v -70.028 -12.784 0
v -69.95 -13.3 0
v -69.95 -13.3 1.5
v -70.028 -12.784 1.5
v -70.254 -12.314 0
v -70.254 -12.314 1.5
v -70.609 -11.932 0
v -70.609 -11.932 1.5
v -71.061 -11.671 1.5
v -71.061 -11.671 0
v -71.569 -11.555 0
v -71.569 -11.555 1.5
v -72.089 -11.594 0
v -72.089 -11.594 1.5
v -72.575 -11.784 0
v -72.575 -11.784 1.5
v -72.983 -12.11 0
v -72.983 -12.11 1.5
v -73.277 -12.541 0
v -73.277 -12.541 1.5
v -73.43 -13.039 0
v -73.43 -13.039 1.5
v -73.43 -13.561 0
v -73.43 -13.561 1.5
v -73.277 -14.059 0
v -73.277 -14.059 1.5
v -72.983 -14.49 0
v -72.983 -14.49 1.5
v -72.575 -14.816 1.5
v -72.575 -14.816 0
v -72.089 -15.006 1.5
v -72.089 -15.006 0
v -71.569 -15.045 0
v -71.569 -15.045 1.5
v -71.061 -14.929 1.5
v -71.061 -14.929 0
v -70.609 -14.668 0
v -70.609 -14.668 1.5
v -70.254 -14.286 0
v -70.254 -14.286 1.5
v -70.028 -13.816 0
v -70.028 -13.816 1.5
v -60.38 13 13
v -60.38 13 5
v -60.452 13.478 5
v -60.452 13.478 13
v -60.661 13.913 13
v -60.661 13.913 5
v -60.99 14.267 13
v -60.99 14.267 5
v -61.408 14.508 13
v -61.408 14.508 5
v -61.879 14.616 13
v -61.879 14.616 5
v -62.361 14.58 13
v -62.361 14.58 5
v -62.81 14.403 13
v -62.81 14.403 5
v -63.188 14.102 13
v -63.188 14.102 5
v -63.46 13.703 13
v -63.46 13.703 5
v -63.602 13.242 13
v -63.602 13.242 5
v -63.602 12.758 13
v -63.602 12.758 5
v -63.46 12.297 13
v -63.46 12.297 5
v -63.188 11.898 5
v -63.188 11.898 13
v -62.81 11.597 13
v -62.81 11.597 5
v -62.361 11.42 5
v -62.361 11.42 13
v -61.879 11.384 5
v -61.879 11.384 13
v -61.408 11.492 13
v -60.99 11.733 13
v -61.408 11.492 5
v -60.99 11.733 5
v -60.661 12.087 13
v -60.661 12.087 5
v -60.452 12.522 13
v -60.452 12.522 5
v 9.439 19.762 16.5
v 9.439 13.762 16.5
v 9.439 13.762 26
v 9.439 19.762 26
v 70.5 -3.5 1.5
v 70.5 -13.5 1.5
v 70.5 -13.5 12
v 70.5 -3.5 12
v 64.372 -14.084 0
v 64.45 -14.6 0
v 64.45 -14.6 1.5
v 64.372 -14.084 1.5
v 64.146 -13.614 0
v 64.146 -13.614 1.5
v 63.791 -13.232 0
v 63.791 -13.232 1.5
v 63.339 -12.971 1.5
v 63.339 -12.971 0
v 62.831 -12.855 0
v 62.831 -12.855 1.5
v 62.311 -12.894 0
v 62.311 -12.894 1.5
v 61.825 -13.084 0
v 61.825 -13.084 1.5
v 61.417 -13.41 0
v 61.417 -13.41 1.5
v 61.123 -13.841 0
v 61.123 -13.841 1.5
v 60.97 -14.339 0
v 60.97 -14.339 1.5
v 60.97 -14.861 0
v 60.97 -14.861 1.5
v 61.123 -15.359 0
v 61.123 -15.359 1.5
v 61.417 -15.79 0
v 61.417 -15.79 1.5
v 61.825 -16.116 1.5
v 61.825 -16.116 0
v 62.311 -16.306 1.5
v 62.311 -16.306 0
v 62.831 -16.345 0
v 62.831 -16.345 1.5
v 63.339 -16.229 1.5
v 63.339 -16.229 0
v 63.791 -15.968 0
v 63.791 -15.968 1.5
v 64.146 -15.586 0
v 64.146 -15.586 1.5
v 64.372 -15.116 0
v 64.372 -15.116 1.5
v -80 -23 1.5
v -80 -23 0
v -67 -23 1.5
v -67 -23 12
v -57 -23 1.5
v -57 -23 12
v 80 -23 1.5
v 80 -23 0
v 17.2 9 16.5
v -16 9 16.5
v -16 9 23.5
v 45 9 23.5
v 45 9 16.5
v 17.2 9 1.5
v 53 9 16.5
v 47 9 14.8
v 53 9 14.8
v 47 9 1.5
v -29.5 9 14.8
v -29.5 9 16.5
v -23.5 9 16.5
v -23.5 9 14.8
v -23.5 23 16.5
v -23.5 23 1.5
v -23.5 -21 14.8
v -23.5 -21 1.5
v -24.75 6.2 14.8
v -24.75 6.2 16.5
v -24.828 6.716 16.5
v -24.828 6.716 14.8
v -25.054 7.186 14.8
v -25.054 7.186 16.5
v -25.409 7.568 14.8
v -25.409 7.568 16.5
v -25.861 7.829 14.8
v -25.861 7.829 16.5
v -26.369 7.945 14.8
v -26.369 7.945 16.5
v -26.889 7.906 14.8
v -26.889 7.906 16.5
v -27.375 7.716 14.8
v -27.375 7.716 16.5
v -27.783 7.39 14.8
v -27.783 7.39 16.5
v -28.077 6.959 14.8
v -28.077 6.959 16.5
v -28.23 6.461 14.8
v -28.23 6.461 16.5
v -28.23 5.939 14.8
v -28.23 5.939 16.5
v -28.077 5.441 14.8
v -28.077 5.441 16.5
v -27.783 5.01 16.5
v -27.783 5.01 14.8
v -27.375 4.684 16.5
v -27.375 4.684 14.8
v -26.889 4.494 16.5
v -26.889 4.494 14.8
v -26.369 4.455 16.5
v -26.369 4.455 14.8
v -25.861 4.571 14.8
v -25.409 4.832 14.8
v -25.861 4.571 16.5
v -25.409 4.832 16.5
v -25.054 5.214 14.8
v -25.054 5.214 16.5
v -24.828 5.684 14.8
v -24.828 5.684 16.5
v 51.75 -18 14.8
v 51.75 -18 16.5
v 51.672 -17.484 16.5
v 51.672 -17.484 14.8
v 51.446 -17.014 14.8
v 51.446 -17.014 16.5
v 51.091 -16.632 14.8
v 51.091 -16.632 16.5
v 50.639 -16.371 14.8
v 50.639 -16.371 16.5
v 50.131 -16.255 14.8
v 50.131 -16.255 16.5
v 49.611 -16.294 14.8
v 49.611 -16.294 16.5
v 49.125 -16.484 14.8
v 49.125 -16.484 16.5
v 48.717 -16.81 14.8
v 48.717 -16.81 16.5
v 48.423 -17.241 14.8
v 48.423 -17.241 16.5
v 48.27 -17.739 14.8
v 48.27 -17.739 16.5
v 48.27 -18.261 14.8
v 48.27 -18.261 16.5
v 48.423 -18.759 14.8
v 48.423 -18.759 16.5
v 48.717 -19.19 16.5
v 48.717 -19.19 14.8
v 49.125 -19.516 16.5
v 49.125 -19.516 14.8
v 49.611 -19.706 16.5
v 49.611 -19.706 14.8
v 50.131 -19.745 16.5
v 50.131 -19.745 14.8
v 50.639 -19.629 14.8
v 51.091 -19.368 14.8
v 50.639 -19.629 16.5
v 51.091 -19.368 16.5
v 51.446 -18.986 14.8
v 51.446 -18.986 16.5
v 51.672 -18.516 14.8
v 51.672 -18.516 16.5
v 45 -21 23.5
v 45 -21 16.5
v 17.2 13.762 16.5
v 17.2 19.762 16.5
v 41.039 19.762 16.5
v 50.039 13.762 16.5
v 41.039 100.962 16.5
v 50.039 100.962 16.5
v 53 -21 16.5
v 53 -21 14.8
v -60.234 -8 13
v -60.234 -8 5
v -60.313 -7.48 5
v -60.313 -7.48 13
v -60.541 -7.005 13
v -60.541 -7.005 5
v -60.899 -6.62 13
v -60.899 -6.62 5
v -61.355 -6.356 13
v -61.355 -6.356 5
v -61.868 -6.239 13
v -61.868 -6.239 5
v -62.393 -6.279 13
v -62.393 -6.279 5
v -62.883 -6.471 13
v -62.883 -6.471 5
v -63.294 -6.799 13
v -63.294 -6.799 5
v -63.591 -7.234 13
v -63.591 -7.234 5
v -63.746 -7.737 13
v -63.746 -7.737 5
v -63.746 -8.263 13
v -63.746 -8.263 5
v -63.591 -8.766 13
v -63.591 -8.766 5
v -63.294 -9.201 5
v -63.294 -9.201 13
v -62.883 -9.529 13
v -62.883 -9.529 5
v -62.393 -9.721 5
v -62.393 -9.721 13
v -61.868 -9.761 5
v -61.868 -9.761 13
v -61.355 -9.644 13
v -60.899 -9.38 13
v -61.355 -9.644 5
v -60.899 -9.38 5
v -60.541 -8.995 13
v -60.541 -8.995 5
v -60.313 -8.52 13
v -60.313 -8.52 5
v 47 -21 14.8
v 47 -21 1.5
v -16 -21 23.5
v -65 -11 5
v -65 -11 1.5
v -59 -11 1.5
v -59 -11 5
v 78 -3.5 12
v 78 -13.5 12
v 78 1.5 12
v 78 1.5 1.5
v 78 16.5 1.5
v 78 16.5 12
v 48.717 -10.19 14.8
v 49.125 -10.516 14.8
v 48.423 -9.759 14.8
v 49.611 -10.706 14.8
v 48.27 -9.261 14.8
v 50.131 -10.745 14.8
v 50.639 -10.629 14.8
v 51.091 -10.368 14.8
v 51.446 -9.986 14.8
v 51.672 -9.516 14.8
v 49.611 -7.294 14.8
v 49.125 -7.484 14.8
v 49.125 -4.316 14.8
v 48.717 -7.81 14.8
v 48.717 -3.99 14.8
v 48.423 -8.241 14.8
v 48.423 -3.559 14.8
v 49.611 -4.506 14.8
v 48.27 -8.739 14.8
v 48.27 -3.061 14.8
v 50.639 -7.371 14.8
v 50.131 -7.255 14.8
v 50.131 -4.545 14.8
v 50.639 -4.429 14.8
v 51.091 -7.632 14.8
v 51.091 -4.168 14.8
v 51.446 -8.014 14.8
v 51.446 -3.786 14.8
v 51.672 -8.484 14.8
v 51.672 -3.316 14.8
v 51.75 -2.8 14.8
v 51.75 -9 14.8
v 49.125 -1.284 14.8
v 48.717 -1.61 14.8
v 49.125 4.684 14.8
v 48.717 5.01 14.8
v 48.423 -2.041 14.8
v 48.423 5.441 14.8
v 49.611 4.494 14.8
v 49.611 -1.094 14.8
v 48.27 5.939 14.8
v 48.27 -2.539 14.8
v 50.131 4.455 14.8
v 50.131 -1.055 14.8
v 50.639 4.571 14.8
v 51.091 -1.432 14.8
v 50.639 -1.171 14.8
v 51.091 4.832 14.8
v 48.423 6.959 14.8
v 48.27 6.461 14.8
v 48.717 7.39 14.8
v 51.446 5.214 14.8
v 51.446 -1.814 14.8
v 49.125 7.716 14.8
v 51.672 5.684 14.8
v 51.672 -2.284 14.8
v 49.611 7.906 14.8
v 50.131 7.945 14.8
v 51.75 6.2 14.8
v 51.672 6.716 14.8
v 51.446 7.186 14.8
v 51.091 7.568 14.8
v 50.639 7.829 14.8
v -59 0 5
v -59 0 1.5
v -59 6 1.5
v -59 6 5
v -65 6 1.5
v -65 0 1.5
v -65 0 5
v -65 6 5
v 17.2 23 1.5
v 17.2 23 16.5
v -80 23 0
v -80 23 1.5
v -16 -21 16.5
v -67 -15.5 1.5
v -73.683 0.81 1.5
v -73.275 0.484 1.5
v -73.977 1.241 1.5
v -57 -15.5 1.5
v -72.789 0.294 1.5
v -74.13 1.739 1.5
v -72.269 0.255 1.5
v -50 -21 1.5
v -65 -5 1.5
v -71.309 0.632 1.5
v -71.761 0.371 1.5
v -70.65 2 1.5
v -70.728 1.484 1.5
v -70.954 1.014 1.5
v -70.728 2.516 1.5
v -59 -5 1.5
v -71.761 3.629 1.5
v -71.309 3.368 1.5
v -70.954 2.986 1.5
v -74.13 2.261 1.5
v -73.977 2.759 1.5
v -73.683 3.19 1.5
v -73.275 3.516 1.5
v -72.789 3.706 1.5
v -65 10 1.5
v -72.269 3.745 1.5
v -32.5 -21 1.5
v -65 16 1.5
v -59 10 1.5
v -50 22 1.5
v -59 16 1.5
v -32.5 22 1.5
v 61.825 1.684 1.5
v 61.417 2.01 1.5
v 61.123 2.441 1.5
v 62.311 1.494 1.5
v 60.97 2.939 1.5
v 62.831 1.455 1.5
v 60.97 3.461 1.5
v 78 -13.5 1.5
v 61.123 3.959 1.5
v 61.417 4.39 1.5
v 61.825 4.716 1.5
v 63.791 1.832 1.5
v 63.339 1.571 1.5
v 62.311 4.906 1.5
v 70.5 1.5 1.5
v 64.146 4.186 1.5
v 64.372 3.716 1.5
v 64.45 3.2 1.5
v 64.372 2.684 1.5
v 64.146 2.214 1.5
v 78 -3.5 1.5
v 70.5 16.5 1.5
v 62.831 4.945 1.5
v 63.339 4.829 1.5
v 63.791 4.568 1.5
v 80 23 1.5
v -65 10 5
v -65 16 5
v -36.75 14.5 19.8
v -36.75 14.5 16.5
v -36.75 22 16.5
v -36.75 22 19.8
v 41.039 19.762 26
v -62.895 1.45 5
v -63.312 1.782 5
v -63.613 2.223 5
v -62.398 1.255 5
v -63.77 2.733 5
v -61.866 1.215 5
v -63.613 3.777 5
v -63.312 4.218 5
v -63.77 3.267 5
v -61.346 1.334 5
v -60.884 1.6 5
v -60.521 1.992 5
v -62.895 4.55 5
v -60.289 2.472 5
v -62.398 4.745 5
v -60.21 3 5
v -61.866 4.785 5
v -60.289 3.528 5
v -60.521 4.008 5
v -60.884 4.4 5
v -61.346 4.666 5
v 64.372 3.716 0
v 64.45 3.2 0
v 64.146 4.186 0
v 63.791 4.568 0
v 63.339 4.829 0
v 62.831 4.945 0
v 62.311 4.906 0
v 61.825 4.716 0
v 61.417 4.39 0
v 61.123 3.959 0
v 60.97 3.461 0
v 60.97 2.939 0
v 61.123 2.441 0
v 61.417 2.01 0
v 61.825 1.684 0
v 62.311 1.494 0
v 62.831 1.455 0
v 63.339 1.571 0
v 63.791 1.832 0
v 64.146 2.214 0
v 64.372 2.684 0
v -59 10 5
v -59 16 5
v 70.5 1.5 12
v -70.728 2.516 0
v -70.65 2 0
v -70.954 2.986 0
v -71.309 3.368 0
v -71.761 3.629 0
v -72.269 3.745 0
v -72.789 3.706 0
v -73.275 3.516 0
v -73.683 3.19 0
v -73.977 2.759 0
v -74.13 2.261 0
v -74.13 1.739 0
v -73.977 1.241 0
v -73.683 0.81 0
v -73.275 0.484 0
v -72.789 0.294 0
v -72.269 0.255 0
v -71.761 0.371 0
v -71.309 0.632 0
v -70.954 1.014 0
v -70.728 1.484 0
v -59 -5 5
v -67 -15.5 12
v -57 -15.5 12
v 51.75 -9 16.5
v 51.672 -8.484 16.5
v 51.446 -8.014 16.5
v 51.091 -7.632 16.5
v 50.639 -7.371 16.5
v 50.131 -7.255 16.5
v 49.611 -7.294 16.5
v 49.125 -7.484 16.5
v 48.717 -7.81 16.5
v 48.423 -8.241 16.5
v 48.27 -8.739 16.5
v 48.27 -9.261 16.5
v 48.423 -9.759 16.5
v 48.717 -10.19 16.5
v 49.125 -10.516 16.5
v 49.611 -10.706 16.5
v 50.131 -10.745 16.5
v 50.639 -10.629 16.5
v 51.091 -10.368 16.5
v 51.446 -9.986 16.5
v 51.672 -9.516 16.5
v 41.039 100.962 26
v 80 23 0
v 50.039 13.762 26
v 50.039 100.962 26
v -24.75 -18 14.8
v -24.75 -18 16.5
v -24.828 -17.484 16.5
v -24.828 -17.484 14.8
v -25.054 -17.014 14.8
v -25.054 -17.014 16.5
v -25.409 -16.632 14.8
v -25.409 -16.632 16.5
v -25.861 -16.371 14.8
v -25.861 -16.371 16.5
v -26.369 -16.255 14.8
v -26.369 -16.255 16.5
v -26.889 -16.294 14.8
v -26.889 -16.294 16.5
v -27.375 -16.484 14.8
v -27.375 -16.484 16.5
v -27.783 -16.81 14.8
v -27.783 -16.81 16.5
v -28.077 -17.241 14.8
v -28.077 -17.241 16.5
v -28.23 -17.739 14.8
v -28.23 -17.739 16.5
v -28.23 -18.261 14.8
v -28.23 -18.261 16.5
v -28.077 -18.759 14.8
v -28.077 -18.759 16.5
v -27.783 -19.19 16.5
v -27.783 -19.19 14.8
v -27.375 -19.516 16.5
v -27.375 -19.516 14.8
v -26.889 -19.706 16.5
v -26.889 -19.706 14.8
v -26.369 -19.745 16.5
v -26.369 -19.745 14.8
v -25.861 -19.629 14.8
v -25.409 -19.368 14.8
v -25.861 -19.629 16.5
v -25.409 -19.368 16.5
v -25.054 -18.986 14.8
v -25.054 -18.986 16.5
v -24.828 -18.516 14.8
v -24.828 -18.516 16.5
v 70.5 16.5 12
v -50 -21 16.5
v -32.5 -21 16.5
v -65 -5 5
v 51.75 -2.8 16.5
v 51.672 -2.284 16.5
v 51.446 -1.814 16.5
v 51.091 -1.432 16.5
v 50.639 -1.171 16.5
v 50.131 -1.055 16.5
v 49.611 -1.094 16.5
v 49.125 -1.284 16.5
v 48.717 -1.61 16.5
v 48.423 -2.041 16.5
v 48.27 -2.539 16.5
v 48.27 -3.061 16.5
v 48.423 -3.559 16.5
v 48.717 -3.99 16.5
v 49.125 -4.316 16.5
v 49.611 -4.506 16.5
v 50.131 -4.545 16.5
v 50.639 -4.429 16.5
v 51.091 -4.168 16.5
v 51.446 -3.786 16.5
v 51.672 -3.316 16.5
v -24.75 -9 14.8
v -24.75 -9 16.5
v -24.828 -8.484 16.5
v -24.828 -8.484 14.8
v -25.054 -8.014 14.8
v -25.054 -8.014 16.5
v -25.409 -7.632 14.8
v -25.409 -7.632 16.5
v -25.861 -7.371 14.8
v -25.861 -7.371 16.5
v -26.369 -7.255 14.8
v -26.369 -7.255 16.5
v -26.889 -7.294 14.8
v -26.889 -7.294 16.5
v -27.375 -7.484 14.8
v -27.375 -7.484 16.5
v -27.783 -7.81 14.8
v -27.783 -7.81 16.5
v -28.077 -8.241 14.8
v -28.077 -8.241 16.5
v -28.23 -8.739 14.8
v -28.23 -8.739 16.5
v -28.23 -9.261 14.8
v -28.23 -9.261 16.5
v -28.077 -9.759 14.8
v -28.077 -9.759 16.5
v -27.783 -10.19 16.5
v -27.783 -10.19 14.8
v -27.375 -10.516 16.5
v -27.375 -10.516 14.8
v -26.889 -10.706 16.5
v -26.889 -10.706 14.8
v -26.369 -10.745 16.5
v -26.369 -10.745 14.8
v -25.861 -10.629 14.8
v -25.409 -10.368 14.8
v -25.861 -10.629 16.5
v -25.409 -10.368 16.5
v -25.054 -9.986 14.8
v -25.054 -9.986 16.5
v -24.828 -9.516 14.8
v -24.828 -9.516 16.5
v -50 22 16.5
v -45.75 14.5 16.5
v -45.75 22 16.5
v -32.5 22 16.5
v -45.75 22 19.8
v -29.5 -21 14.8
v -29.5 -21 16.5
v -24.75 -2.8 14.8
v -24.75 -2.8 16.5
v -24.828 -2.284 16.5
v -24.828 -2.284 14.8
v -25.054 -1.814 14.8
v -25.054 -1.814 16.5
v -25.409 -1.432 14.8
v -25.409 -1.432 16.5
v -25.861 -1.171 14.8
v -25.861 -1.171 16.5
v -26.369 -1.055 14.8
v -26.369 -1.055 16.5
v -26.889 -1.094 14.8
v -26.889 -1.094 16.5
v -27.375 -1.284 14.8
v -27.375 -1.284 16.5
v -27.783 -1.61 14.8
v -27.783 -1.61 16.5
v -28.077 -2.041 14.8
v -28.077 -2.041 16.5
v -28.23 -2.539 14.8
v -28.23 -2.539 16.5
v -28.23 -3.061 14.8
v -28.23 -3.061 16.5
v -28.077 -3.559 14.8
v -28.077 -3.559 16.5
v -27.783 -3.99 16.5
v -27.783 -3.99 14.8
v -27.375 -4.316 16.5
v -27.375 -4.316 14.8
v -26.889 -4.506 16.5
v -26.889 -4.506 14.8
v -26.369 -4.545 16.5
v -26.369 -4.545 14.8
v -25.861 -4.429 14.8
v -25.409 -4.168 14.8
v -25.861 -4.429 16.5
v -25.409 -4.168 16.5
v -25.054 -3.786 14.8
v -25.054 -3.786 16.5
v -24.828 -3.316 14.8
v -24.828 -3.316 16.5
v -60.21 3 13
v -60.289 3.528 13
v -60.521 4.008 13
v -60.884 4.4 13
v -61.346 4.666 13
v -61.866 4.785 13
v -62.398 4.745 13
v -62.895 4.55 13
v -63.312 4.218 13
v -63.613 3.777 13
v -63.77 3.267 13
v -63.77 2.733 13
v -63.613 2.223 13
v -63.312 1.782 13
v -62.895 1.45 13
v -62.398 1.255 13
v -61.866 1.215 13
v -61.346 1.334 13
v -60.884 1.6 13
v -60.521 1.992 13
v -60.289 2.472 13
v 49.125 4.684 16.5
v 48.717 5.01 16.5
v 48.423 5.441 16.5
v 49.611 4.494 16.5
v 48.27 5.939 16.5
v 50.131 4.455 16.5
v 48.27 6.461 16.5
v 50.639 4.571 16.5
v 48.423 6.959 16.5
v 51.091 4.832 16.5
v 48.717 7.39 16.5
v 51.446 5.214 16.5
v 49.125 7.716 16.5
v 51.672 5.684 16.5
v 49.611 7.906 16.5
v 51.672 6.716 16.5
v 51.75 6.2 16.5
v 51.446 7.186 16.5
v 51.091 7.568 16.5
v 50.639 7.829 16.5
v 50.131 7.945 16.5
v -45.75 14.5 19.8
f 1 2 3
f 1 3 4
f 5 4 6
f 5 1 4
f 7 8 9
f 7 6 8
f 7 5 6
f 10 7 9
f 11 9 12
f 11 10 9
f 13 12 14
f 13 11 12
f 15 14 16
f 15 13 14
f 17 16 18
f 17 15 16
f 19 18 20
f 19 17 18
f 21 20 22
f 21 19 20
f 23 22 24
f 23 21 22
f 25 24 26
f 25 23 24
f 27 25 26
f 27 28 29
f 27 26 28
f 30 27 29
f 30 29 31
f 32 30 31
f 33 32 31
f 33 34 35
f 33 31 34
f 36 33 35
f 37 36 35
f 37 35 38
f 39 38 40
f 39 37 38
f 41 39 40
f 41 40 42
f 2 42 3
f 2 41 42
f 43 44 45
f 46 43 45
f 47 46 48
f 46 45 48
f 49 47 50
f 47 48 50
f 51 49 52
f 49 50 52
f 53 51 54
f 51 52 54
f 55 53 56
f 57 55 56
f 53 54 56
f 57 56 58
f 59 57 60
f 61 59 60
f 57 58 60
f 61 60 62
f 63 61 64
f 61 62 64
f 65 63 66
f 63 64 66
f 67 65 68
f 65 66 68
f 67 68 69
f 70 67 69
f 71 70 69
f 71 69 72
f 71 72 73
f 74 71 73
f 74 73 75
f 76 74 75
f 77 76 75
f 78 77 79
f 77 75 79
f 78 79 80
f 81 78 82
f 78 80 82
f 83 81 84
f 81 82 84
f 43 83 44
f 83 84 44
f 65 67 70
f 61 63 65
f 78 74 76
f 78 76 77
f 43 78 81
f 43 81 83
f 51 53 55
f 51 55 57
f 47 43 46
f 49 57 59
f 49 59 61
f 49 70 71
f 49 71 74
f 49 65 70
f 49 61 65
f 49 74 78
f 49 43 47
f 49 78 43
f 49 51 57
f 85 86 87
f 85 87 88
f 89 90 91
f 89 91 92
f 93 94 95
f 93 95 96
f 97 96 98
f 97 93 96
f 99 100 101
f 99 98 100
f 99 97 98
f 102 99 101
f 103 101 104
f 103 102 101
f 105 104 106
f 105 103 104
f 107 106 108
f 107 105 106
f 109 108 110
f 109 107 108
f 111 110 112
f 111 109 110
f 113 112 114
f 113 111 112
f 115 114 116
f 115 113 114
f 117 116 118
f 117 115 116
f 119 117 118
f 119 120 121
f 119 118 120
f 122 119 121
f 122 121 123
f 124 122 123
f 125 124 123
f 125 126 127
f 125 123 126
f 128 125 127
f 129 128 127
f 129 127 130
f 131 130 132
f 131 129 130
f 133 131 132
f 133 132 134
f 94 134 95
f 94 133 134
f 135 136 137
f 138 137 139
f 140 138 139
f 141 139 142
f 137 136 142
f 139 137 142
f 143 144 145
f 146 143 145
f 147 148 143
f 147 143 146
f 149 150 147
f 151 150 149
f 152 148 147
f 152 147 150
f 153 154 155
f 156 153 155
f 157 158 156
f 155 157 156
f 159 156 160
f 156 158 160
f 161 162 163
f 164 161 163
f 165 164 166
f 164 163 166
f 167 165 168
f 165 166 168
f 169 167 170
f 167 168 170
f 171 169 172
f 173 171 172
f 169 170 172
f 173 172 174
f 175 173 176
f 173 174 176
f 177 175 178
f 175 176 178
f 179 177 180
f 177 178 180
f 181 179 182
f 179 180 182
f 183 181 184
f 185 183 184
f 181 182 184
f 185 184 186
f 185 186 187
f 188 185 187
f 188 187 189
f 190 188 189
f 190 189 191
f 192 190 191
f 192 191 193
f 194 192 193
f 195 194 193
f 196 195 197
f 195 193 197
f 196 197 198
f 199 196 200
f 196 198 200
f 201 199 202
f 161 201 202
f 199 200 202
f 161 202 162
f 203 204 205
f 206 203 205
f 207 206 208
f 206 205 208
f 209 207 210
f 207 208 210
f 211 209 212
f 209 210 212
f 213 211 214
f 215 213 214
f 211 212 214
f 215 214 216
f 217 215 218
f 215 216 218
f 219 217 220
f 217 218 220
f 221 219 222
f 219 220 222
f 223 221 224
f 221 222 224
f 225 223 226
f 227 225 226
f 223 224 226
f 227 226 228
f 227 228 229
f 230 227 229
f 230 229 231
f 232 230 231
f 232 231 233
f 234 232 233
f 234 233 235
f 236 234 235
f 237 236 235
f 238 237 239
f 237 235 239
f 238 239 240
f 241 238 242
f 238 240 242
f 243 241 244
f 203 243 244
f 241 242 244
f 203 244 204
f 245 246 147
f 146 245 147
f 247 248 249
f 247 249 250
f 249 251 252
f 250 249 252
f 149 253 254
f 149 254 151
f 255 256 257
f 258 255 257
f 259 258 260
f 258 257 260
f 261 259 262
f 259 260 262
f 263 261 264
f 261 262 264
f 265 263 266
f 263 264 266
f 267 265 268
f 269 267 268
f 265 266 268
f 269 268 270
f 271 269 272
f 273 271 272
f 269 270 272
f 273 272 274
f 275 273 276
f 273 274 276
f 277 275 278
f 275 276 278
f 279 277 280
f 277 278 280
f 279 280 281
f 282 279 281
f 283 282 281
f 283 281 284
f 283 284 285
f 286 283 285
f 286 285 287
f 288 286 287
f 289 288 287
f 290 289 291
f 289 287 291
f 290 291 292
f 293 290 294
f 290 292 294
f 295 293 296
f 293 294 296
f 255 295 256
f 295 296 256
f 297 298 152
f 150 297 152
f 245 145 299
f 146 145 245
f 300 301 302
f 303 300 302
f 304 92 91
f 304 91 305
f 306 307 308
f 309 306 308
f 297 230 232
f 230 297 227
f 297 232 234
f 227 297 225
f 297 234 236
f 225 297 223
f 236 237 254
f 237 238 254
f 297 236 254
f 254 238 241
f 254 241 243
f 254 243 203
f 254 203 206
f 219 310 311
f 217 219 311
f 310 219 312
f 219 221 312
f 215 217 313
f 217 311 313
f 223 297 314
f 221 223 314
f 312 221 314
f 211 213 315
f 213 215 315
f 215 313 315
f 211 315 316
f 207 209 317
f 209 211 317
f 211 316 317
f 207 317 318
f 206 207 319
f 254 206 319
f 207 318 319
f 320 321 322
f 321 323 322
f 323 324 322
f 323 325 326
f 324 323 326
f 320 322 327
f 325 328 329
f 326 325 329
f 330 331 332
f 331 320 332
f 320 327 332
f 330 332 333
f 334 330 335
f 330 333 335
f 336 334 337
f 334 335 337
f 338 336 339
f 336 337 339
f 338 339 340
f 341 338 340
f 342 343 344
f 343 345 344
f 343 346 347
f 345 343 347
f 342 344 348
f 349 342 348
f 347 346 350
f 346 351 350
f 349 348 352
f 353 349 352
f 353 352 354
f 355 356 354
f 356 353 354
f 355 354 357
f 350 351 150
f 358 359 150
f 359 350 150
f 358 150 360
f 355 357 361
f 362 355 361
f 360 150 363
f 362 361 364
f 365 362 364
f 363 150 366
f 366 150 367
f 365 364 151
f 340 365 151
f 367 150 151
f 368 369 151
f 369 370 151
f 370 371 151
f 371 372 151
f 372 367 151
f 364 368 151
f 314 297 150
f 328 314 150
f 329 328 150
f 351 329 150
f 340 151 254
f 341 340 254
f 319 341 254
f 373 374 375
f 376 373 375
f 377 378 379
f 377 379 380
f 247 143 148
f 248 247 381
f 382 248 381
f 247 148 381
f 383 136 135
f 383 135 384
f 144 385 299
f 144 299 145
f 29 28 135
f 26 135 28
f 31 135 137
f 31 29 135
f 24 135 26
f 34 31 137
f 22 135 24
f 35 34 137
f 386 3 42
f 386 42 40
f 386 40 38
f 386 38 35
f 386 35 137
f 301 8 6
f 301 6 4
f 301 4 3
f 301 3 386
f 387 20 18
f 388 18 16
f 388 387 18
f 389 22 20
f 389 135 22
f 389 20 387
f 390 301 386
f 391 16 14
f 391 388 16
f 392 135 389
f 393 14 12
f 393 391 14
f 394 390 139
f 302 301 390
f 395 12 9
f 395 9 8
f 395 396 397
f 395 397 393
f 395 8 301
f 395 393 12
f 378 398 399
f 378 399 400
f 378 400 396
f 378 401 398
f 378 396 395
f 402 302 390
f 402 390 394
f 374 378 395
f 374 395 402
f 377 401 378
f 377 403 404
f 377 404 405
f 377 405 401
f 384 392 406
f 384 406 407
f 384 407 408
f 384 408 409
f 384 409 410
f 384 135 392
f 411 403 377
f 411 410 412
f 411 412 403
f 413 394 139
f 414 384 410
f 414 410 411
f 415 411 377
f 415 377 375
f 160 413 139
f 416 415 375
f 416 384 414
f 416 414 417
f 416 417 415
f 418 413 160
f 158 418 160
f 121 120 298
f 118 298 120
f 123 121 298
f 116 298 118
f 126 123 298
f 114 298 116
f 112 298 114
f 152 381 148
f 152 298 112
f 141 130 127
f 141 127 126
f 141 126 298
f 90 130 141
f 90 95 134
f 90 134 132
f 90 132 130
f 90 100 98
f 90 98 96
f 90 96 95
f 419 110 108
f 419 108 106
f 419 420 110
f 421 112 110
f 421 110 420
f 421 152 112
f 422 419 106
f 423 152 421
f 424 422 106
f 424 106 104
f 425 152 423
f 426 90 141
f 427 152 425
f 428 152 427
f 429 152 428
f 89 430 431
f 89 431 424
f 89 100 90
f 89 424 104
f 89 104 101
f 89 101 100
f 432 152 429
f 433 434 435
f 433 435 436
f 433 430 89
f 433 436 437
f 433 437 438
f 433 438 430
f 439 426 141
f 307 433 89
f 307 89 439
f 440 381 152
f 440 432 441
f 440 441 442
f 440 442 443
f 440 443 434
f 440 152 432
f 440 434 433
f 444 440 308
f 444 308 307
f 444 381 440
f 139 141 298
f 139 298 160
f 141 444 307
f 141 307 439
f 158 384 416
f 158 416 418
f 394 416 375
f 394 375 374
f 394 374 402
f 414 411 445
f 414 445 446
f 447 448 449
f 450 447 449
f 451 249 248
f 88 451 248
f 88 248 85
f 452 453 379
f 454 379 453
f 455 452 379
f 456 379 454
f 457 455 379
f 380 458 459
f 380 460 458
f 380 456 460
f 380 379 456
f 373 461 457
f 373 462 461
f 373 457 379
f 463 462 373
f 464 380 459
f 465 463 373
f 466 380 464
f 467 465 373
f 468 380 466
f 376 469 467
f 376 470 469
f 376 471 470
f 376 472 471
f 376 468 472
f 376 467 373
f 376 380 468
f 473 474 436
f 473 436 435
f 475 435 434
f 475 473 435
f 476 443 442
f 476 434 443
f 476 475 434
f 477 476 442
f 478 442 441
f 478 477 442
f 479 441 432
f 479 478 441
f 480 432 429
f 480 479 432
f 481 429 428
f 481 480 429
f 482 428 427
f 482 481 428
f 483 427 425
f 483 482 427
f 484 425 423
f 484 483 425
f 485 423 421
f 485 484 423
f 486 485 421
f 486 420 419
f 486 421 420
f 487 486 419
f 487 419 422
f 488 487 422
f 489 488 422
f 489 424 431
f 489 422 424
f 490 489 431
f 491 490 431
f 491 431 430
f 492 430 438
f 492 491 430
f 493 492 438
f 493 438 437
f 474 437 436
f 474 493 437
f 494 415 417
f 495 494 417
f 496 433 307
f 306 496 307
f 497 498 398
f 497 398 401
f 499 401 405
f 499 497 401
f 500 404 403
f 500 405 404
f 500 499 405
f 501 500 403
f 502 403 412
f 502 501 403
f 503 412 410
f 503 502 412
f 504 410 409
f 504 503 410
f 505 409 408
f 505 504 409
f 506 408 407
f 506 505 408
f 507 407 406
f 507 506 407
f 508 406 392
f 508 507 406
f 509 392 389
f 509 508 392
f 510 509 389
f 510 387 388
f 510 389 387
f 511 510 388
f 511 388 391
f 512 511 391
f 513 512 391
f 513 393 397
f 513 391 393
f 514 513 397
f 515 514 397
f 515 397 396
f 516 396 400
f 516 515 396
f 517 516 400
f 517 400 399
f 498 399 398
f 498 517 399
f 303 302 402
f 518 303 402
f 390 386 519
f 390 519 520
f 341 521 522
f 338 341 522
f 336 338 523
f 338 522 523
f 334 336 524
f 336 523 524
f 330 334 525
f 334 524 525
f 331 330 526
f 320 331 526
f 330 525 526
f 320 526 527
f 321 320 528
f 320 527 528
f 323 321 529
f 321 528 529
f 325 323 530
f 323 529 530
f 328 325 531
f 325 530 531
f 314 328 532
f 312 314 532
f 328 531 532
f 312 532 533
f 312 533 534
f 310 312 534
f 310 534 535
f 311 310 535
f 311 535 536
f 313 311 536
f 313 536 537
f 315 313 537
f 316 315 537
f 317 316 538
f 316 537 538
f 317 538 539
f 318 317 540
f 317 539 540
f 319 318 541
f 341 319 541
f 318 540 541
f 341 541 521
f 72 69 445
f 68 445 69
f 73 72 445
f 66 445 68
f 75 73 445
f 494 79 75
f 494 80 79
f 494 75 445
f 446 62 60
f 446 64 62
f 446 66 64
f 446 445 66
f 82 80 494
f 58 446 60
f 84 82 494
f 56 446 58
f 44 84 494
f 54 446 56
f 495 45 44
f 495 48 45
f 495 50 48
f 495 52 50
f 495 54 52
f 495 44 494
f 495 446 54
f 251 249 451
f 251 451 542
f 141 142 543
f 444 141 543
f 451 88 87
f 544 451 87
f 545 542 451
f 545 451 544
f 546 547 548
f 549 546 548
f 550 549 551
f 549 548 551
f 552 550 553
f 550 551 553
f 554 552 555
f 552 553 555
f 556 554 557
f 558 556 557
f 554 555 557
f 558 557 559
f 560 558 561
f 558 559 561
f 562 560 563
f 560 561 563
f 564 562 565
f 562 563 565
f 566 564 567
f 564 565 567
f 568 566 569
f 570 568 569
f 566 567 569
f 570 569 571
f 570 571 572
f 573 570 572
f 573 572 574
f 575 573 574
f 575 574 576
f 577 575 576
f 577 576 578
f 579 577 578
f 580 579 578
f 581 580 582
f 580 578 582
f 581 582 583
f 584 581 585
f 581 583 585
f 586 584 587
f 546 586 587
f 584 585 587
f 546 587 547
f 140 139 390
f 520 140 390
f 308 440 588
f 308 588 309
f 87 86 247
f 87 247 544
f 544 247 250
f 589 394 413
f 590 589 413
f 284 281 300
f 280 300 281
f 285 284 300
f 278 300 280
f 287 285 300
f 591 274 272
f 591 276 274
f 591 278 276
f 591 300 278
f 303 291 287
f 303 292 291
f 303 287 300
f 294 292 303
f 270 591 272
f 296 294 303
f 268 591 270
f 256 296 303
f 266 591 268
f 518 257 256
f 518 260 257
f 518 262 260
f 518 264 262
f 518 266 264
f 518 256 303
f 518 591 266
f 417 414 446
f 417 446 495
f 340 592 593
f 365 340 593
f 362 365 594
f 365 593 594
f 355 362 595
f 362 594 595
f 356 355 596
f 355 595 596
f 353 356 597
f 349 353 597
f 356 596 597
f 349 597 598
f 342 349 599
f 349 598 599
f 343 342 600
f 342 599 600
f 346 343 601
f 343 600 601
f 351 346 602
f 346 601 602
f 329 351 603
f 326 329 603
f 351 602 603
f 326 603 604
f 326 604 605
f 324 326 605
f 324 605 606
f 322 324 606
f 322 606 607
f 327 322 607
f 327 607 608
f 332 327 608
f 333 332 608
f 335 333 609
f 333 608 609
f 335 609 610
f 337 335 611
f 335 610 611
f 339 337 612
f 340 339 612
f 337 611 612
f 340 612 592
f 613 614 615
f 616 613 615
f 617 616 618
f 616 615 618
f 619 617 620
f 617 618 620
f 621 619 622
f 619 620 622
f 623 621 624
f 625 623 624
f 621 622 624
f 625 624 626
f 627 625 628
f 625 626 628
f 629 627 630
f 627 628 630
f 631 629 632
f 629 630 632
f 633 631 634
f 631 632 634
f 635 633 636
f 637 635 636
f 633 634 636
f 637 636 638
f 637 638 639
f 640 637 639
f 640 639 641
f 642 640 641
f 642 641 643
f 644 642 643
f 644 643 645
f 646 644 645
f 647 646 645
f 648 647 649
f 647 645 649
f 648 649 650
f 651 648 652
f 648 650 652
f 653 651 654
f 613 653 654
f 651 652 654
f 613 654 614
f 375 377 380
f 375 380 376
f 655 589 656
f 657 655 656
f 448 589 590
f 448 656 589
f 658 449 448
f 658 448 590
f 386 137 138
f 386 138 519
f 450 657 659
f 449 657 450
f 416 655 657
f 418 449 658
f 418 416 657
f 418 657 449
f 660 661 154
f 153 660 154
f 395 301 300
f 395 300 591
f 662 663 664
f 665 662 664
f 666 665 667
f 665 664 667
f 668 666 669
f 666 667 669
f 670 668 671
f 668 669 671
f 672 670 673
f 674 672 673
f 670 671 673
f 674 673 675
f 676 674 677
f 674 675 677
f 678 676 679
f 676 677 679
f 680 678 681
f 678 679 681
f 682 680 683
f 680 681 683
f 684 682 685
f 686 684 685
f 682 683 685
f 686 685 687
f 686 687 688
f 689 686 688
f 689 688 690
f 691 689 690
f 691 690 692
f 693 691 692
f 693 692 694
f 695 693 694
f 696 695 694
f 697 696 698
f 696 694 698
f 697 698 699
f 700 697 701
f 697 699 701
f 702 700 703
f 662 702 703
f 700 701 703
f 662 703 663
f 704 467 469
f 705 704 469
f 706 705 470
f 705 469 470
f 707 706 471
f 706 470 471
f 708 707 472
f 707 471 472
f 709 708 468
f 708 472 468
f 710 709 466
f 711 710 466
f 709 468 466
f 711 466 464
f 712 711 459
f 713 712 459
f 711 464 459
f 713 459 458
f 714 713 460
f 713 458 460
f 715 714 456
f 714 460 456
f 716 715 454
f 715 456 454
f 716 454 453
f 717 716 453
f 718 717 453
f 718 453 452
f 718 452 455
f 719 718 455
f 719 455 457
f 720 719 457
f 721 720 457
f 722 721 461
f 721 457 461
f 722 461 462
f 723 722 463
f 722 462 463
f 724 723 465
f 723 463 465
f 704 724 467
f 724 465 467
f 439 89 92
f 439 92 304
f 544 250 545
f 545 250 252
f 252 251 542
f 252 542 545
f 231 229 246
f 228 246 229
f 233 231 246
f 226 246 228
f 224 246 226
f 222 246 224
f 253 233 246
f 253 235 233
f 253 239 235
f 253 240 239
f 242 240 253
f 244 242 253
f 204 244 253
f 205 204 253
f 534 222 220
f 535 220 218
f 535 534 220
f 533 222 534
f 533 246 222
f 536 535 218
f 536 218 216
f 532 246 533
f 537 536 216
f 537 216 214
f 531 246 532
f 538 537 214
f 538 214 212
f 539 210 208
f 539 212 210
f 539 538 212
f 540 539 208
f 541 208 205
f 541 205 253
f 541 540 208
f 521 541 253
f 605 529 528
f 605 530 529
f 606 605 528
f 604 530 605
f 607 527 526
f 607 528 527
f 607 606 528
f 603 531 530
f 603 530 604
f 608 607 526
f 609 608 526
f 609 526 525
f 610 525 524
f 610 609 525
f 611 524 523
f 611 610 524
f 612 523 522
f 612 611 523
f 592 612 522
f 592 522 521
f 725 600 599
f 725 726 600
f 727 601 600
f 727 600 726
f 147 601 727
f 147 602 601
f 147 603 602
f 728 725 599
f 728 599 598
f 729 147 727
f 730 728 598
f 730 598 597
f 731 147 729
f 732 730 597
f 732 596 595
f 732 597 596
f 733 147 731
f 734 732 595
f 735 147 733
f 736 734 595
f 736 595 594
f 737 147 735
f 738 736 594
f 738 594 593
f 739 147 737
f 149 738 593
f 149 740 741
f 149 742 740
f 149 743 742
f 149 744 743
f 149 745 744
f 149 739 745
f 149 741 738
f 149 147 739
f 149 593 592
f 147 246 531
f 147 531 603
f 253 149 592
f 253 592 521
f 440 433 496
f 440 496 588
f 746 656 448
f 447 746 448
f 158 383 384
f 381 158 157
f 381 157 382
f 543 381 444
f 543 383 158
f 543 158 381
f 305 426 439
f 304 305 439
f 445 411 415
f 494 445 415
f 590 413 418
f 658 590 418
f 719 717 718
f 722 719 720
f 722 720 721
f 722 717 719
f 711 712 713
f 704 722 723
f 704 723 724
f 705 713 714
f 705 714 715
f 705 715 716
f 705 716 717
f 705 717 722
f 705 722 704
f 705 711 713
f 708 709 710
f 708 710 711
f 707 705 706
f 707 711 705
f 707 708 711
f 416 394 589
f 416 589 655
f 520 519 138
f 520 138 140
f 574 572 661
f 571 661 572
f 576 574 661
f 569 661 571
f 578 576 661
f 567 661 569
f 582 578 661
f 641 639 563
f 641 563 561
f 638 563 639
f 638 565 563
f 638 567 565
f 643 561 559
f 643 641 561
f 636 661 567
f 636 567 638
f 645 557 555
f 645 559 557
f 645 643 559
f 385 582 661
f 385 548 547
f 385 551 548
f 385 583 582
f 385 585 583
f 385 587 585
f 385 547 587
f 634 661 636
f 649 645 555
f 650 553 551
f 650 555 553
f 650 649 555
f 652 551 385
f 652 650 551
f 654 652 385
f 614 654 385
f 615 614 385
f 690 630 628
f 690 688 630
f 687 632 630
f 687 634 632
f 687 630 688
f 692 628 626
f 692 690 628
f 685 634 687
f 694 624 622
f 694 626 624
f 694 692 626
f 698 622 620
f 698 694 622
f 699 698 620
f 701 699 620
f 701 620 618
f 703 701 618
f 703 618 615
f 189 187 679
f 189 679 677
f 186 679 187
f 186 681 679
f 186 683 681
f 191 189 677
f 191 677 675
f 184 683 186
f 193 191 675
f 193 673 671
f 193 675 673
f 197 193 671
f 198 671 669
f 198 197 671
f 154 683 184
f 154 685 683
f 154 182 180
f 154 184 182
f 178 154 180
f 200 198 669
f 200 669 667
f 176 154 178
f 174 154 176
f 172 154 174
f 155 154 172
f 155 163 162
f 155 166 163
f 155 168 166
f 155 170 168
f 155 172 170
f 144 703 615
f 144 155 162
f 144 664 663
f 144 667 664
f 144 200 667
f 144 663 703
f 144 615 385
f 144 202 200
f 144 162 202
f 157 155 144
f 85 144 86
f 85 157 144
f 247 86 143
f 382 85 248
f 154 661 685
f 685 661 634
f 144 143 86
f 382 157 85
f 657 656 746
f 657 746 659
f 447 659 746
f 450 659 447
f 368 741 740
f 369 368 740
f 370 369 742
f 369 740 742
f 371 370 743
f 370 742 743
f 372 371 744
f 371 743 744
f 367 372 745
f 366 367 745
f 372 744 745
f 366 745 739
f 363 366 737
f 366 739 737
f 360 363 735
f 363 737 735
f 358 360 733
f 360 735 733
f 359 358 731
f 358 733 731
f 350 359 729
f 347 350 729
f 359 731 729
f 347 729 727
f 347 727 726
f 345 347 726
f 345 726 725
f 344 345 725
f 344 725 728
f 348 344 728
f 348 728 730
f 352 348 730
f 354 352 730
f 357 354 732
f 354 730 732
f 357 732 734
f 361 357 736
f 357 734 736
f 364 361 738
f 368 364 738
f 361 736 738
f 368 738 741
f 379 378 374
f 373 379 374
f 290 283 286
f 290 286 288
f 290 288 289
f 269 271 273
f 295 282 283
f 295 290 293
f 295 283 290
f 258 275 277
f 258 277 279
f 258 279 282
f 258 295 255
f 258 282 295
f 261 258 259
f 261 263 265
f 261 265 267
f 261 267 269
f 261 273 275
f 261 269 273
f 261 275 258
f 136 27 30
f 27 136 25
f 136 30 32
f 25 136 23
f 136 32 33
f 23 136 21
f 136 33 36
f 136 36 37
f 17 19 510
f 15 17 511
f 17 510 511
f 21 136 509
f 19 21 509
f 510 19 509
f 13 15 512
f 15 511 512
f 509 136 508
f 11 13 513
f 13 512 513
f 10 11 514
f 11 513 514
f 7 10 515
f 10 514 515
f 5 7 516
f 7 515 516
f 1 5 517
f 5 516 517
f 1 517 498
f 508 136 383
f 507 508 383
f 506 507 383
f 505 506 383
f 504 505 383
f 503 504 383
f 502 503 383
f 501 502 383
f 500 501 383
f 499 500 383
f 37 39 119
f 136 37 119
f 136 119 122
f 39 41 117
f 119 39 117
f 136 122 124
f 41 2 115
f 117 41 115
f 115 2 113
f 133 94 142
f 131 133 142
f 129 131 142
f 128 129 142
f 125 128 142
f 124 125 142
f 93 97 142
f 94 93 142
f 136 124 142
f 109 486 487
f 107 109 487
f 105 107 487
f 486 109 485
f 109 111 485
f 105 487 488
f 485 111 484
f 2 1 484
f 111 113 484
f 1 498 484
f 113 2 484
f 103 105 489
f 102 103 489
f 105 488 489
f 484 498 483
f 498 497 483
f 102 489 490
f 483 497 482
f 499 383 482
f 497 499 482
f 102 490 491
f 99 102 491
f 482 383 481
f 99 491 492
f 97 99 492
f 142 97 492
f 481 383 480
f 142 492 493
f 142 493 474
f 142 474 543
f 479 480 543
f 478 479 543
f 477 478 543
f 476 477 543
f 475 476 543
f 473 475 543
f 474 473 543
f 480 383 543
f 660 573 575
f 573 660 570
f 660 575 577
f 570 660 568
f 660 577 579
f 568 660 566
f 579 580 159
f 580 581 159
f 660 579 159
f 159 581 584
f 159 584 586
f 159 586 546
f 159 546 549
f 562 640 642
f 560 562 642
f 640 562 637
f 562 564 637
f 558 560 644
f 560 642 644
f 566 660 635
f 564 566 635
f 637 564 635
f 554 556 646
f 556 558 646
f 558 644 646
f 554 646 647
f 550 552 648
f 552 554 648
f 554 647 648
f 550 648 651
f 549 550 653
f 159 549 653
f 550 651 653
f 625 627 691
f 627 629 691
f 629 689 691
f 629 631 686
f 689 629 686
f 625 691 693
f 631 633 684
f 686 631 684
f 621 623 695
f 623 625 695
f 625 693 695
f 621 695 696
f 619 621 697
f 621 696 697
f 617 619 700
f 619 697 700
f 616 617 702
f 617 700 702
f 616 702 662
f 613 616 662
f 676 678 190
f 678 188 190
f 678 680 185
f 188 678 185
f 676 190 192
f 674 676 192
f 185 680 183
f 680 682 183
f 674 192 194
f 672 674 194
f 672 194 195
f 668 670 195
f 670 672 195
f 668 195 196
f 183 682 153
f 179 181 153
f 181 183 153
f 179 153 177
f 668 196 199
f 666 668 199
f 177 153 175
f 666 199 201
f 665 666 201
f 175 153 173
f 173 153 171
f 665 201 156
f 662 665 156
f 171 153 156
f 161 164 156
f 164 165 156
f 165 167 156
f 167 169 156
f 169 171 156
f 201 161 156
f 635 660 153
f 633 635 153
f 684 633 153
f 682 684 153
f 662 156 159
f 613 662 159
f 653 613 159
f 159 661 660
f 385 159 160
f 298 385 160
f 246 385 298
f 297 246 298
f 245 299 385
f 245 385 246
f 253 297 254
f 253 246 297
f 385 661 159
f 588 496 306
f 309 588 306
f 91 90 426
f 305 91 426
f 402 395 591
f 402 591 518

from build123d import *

# Parameters (mm, degrees)
SKICA1_W                      = 160
SKICA1_H                      = 46
P_IDAT_VYSUNUT_M1_DEPTH       = 1.5
ODEBRAT_VYSUNUT_M1_DEPTH      = 84.254129027
ODEBRAT_VYSUNUT_M1_DEPTH_BACK = 84.254129027
SKICA2_R                      = 1.75
SKICA3_W                      = 10
SKICA3_H                      = 7.5
SKICA3_W_2                    = 7.5
SKICA3_H_2                    = 10
SKICA3_H_3                    = 15
P_IDAT_VYSUNUT_M2_DEPTH       = 10.5
SKICA5_W                      = 6
SKICA5_H                      = 6
P_IDAT_VYSUNUT_M3_DEPTH       = 3.5
SKICA6_R                      = 1.620409531
SKICA6_R_2                    = 1.790047617
SKICA6_R_3                    = 1.76567532
P_IDAT_VYSUNUT_M4_DEPTH       = 8
SKICA7_W                      = 17.5
SKICA7_H                      = 43
SKICA7_W_2                    = 70.5
SKICA7_H_2                    = 30
SKICA7_W_3                    = 40.7
SKICA7_H_3                    = 14
P_IDAT_VYSUNUT_M5_DEPTH       = 15
SKICA8_W                      = 9
SKICA8_H                      = 7.5
P_IDAT_VYSUNUT_M6_DEPTH       = 3.3
SKICA13_W                     = 23.838883278
SKICA13_H                     = 6
SKICA13_W_2                   = 9
SKICA13_H_2                   = 81.2
SKICA13_W_3                   = 7.761116722
P_IDAT_VYSUNUT_M7_DEPTH       = 9.5
SKICA14_W                     = 61
SKICA14_H                     = 30
P_IDAT_VYSUNUT_M8_DEPTH       = 7
SKICA15_W                     = 6
SKICA15_H                     = 30
SKICA15_R                     = 1.75
P_IDAT_VYSUNUT_M9_DEPTH       = 1.7


with BuildPart() as part:
    # Skica1 → Přidat vysunutím1 (new body)
    with BuildSketch(Plane.XY):
        Rectangle(SKICA1_W, SKICA1_H)
    extrude(amount=P_IDAT_VYSUNUT_M1_DEPTH)

    # Skica2 → Odebrat vysunutím1 (cut, two sides: drawn at the far end of the back side and taken through both)
    with BuildSketch(Plane.XY.offset(1.5).offset(-ODEBRAT_VYSUNUT_M1_DEPTH_BACK)):
        with Locations((-71.7, -13.3)):
            Circle(SKICA2_R)
        with Locations((-72.4, 2)):
            Circle(SKICA2_R)
        with Locations((62.7, 3.2)):
            Circle(SKICA2_R)
        with Locations((62.7, -14.6)):
            Circle(SKICA2_R)
    extrude(amount=ODEBRAT_VYSUNUT_M1_DEPTH + ODEBRAT_VYSUNUT_M1_DEPTH_BACK, mode=Mode.SUBTRACT)

    # Skica3 → Přidat vysunutím2 (add)
    with BuildSketch(Plane.XY.offset(1.5)):
        with Locations((-62, -19.25)):
            Rectangle(SKICA3_W, SKICA3_H)
        with Locations((74.25, -8.5)):
            Rectangle(SKICA3_W_2, SKICA3_H_2)
        with Locations((74.25, 9)):
            Rectangle(SKICA3_W_2, SKICA3_H_3)
    extrude(amount=P_IDAT_VYSUNUT_M2_DEPTH)

    # Skica5 → Přidat vysunutím3 (add)
    with BuildSketch(Plane.XY.offset(1.5)):
        with Locations((-62, -8)):
            Rectangle(SKICA5_W, SKICA5_H)
        with Locations((-62, 3)):
            Rectangle(SKICA5_W, SKICA5_H)
        with Locations((-62, 13)):
            Rectangle(SKICA5_W, SKICA5_H)
    extrude(amount=P_IDAT_VYSUNUT_M3_DEPTH)

    # Skica6 → Přidat vysunutím4 (add)
    with BuildSketch(Plane.XY.offset(5)):
        with Locations((-62, 13)):
            Circle(SKICA6_R)
        with Locations((-62, 3)):
            Circle(SKICA6_R_2)
        with Locations((-62, -8)):
            Circle(SKICA6_R_3)
    extrude(amount=P_IDAT_VYSUNUT_M4_DEPTH)

    # Skica7 → Přidat vysunutím5 (add)
    with BuildSketch(Plane.XY.offset(1.5)):
        with Locations((-41.25, 0.5)):
            Rectangle(SKICA7_W, SKICA7_H)
        with Locations((11.75, -6)):
            Rectangle(SKICA7_W_2, SKICA7_H_2)
        with Locations((-3.15, 16)):
            Rectangle(SKICA7_W_3, SKICA7_H_3)
    extrude(amount=P_IDAT_VYSUNUT_M5_DEPTH)

    # Skica8 → Přidat vysunutím6 (add)
    with BuildSketch(Plane.XY.offset(16.5)):
        with Locations((-41.25, 18.25)):
            Rectangle(SKICA8_W, SKICA8_H)
    extrude(amount=P_IDAT_VYSUNUT_M6_DEPTH)

    # Skica13 → Přidat vysunutím7 (add)
    with BuildSketch(Plane.XY.offset(16.5)):
        with Locations((29.119441639, 16.761519328)):
            Rectangle(SKICA13_W, SKICA13_H)
        with Locations((45.538883278, 16.761519328)):
            Rectangle(SKICA13_W_2, SKICA13_H)
        with Locations((45.538883278, 60.361519328)):
            Rectangle(SKICA13_W_2, SKICA13_H_2)
        with Locations((13.319441639, 16.761519328)):
            Rectangle(SKICA13_W_3, SKICA13_H)
    extrude(amount=P_IDAT_VYSUNUT_M7_DEPTH)

    # Skica14 → Přidat vysunutím8 (add)
    with BuildSketch(Plane.XY.offset(16.5)):
        with Locations((14.5, -6)):
            Rectangle(SKICA14_W, SKICA14_H)
    extrude(amount=P_IDAT_VYSUNUT_M8_DEPTH)

    # Skica15 → Přidat vysunutím9 (add)
    # profile 1 of 2: a face of its own
    with BuildSketch(Plane.XY.offset(16.5)):
        with Locations((-26.5, -6)):
            Rectangle(SKICA15_W, SKICA15_H)
        with Locations((-26.5, -18)):
            Circle(SKICA15_R, mode=Mode.SUBTRACT)
        with Locations((-26.5, 6.2)):
            Circle(SKICA15_R, mode=Mode.SUBTRACT)
        with Locations((-26.5, -9)):
            Circle(SKICA15_R, mode=Mode.SUBTRACT)
        with Locations((-26.5, -2.8)):
            Circle(SKICA15_R, mode=Mode.SUBTRACT)
    # profile 2 of 2: a face of its own
    with BuildSketch(Plane.XY.offset(16.5)):
        with Locations((50, -6)):
            Rectangle(SKICA15_W, SKICA15_H)
        with Locations((50, -18)):
            Circle(SKICA15_R, mode=Mode.SUBTRACT)
        with Locations((50, -9)):
            Circle(SKICA15_R, mode=Mode.SUBTRACT)
        with Locations((50, -2.8)):
            Circle(SKICA15_R, mode=Mode.SUBTRACT)
        with Locations((50, 6.2)):
            Circle(SKICA15_R, mode=Mode.SUBTRACT)
    extrude(amount=-P_IDAT_VYSUNUT_M9_DEPTH)


solid = part.part
